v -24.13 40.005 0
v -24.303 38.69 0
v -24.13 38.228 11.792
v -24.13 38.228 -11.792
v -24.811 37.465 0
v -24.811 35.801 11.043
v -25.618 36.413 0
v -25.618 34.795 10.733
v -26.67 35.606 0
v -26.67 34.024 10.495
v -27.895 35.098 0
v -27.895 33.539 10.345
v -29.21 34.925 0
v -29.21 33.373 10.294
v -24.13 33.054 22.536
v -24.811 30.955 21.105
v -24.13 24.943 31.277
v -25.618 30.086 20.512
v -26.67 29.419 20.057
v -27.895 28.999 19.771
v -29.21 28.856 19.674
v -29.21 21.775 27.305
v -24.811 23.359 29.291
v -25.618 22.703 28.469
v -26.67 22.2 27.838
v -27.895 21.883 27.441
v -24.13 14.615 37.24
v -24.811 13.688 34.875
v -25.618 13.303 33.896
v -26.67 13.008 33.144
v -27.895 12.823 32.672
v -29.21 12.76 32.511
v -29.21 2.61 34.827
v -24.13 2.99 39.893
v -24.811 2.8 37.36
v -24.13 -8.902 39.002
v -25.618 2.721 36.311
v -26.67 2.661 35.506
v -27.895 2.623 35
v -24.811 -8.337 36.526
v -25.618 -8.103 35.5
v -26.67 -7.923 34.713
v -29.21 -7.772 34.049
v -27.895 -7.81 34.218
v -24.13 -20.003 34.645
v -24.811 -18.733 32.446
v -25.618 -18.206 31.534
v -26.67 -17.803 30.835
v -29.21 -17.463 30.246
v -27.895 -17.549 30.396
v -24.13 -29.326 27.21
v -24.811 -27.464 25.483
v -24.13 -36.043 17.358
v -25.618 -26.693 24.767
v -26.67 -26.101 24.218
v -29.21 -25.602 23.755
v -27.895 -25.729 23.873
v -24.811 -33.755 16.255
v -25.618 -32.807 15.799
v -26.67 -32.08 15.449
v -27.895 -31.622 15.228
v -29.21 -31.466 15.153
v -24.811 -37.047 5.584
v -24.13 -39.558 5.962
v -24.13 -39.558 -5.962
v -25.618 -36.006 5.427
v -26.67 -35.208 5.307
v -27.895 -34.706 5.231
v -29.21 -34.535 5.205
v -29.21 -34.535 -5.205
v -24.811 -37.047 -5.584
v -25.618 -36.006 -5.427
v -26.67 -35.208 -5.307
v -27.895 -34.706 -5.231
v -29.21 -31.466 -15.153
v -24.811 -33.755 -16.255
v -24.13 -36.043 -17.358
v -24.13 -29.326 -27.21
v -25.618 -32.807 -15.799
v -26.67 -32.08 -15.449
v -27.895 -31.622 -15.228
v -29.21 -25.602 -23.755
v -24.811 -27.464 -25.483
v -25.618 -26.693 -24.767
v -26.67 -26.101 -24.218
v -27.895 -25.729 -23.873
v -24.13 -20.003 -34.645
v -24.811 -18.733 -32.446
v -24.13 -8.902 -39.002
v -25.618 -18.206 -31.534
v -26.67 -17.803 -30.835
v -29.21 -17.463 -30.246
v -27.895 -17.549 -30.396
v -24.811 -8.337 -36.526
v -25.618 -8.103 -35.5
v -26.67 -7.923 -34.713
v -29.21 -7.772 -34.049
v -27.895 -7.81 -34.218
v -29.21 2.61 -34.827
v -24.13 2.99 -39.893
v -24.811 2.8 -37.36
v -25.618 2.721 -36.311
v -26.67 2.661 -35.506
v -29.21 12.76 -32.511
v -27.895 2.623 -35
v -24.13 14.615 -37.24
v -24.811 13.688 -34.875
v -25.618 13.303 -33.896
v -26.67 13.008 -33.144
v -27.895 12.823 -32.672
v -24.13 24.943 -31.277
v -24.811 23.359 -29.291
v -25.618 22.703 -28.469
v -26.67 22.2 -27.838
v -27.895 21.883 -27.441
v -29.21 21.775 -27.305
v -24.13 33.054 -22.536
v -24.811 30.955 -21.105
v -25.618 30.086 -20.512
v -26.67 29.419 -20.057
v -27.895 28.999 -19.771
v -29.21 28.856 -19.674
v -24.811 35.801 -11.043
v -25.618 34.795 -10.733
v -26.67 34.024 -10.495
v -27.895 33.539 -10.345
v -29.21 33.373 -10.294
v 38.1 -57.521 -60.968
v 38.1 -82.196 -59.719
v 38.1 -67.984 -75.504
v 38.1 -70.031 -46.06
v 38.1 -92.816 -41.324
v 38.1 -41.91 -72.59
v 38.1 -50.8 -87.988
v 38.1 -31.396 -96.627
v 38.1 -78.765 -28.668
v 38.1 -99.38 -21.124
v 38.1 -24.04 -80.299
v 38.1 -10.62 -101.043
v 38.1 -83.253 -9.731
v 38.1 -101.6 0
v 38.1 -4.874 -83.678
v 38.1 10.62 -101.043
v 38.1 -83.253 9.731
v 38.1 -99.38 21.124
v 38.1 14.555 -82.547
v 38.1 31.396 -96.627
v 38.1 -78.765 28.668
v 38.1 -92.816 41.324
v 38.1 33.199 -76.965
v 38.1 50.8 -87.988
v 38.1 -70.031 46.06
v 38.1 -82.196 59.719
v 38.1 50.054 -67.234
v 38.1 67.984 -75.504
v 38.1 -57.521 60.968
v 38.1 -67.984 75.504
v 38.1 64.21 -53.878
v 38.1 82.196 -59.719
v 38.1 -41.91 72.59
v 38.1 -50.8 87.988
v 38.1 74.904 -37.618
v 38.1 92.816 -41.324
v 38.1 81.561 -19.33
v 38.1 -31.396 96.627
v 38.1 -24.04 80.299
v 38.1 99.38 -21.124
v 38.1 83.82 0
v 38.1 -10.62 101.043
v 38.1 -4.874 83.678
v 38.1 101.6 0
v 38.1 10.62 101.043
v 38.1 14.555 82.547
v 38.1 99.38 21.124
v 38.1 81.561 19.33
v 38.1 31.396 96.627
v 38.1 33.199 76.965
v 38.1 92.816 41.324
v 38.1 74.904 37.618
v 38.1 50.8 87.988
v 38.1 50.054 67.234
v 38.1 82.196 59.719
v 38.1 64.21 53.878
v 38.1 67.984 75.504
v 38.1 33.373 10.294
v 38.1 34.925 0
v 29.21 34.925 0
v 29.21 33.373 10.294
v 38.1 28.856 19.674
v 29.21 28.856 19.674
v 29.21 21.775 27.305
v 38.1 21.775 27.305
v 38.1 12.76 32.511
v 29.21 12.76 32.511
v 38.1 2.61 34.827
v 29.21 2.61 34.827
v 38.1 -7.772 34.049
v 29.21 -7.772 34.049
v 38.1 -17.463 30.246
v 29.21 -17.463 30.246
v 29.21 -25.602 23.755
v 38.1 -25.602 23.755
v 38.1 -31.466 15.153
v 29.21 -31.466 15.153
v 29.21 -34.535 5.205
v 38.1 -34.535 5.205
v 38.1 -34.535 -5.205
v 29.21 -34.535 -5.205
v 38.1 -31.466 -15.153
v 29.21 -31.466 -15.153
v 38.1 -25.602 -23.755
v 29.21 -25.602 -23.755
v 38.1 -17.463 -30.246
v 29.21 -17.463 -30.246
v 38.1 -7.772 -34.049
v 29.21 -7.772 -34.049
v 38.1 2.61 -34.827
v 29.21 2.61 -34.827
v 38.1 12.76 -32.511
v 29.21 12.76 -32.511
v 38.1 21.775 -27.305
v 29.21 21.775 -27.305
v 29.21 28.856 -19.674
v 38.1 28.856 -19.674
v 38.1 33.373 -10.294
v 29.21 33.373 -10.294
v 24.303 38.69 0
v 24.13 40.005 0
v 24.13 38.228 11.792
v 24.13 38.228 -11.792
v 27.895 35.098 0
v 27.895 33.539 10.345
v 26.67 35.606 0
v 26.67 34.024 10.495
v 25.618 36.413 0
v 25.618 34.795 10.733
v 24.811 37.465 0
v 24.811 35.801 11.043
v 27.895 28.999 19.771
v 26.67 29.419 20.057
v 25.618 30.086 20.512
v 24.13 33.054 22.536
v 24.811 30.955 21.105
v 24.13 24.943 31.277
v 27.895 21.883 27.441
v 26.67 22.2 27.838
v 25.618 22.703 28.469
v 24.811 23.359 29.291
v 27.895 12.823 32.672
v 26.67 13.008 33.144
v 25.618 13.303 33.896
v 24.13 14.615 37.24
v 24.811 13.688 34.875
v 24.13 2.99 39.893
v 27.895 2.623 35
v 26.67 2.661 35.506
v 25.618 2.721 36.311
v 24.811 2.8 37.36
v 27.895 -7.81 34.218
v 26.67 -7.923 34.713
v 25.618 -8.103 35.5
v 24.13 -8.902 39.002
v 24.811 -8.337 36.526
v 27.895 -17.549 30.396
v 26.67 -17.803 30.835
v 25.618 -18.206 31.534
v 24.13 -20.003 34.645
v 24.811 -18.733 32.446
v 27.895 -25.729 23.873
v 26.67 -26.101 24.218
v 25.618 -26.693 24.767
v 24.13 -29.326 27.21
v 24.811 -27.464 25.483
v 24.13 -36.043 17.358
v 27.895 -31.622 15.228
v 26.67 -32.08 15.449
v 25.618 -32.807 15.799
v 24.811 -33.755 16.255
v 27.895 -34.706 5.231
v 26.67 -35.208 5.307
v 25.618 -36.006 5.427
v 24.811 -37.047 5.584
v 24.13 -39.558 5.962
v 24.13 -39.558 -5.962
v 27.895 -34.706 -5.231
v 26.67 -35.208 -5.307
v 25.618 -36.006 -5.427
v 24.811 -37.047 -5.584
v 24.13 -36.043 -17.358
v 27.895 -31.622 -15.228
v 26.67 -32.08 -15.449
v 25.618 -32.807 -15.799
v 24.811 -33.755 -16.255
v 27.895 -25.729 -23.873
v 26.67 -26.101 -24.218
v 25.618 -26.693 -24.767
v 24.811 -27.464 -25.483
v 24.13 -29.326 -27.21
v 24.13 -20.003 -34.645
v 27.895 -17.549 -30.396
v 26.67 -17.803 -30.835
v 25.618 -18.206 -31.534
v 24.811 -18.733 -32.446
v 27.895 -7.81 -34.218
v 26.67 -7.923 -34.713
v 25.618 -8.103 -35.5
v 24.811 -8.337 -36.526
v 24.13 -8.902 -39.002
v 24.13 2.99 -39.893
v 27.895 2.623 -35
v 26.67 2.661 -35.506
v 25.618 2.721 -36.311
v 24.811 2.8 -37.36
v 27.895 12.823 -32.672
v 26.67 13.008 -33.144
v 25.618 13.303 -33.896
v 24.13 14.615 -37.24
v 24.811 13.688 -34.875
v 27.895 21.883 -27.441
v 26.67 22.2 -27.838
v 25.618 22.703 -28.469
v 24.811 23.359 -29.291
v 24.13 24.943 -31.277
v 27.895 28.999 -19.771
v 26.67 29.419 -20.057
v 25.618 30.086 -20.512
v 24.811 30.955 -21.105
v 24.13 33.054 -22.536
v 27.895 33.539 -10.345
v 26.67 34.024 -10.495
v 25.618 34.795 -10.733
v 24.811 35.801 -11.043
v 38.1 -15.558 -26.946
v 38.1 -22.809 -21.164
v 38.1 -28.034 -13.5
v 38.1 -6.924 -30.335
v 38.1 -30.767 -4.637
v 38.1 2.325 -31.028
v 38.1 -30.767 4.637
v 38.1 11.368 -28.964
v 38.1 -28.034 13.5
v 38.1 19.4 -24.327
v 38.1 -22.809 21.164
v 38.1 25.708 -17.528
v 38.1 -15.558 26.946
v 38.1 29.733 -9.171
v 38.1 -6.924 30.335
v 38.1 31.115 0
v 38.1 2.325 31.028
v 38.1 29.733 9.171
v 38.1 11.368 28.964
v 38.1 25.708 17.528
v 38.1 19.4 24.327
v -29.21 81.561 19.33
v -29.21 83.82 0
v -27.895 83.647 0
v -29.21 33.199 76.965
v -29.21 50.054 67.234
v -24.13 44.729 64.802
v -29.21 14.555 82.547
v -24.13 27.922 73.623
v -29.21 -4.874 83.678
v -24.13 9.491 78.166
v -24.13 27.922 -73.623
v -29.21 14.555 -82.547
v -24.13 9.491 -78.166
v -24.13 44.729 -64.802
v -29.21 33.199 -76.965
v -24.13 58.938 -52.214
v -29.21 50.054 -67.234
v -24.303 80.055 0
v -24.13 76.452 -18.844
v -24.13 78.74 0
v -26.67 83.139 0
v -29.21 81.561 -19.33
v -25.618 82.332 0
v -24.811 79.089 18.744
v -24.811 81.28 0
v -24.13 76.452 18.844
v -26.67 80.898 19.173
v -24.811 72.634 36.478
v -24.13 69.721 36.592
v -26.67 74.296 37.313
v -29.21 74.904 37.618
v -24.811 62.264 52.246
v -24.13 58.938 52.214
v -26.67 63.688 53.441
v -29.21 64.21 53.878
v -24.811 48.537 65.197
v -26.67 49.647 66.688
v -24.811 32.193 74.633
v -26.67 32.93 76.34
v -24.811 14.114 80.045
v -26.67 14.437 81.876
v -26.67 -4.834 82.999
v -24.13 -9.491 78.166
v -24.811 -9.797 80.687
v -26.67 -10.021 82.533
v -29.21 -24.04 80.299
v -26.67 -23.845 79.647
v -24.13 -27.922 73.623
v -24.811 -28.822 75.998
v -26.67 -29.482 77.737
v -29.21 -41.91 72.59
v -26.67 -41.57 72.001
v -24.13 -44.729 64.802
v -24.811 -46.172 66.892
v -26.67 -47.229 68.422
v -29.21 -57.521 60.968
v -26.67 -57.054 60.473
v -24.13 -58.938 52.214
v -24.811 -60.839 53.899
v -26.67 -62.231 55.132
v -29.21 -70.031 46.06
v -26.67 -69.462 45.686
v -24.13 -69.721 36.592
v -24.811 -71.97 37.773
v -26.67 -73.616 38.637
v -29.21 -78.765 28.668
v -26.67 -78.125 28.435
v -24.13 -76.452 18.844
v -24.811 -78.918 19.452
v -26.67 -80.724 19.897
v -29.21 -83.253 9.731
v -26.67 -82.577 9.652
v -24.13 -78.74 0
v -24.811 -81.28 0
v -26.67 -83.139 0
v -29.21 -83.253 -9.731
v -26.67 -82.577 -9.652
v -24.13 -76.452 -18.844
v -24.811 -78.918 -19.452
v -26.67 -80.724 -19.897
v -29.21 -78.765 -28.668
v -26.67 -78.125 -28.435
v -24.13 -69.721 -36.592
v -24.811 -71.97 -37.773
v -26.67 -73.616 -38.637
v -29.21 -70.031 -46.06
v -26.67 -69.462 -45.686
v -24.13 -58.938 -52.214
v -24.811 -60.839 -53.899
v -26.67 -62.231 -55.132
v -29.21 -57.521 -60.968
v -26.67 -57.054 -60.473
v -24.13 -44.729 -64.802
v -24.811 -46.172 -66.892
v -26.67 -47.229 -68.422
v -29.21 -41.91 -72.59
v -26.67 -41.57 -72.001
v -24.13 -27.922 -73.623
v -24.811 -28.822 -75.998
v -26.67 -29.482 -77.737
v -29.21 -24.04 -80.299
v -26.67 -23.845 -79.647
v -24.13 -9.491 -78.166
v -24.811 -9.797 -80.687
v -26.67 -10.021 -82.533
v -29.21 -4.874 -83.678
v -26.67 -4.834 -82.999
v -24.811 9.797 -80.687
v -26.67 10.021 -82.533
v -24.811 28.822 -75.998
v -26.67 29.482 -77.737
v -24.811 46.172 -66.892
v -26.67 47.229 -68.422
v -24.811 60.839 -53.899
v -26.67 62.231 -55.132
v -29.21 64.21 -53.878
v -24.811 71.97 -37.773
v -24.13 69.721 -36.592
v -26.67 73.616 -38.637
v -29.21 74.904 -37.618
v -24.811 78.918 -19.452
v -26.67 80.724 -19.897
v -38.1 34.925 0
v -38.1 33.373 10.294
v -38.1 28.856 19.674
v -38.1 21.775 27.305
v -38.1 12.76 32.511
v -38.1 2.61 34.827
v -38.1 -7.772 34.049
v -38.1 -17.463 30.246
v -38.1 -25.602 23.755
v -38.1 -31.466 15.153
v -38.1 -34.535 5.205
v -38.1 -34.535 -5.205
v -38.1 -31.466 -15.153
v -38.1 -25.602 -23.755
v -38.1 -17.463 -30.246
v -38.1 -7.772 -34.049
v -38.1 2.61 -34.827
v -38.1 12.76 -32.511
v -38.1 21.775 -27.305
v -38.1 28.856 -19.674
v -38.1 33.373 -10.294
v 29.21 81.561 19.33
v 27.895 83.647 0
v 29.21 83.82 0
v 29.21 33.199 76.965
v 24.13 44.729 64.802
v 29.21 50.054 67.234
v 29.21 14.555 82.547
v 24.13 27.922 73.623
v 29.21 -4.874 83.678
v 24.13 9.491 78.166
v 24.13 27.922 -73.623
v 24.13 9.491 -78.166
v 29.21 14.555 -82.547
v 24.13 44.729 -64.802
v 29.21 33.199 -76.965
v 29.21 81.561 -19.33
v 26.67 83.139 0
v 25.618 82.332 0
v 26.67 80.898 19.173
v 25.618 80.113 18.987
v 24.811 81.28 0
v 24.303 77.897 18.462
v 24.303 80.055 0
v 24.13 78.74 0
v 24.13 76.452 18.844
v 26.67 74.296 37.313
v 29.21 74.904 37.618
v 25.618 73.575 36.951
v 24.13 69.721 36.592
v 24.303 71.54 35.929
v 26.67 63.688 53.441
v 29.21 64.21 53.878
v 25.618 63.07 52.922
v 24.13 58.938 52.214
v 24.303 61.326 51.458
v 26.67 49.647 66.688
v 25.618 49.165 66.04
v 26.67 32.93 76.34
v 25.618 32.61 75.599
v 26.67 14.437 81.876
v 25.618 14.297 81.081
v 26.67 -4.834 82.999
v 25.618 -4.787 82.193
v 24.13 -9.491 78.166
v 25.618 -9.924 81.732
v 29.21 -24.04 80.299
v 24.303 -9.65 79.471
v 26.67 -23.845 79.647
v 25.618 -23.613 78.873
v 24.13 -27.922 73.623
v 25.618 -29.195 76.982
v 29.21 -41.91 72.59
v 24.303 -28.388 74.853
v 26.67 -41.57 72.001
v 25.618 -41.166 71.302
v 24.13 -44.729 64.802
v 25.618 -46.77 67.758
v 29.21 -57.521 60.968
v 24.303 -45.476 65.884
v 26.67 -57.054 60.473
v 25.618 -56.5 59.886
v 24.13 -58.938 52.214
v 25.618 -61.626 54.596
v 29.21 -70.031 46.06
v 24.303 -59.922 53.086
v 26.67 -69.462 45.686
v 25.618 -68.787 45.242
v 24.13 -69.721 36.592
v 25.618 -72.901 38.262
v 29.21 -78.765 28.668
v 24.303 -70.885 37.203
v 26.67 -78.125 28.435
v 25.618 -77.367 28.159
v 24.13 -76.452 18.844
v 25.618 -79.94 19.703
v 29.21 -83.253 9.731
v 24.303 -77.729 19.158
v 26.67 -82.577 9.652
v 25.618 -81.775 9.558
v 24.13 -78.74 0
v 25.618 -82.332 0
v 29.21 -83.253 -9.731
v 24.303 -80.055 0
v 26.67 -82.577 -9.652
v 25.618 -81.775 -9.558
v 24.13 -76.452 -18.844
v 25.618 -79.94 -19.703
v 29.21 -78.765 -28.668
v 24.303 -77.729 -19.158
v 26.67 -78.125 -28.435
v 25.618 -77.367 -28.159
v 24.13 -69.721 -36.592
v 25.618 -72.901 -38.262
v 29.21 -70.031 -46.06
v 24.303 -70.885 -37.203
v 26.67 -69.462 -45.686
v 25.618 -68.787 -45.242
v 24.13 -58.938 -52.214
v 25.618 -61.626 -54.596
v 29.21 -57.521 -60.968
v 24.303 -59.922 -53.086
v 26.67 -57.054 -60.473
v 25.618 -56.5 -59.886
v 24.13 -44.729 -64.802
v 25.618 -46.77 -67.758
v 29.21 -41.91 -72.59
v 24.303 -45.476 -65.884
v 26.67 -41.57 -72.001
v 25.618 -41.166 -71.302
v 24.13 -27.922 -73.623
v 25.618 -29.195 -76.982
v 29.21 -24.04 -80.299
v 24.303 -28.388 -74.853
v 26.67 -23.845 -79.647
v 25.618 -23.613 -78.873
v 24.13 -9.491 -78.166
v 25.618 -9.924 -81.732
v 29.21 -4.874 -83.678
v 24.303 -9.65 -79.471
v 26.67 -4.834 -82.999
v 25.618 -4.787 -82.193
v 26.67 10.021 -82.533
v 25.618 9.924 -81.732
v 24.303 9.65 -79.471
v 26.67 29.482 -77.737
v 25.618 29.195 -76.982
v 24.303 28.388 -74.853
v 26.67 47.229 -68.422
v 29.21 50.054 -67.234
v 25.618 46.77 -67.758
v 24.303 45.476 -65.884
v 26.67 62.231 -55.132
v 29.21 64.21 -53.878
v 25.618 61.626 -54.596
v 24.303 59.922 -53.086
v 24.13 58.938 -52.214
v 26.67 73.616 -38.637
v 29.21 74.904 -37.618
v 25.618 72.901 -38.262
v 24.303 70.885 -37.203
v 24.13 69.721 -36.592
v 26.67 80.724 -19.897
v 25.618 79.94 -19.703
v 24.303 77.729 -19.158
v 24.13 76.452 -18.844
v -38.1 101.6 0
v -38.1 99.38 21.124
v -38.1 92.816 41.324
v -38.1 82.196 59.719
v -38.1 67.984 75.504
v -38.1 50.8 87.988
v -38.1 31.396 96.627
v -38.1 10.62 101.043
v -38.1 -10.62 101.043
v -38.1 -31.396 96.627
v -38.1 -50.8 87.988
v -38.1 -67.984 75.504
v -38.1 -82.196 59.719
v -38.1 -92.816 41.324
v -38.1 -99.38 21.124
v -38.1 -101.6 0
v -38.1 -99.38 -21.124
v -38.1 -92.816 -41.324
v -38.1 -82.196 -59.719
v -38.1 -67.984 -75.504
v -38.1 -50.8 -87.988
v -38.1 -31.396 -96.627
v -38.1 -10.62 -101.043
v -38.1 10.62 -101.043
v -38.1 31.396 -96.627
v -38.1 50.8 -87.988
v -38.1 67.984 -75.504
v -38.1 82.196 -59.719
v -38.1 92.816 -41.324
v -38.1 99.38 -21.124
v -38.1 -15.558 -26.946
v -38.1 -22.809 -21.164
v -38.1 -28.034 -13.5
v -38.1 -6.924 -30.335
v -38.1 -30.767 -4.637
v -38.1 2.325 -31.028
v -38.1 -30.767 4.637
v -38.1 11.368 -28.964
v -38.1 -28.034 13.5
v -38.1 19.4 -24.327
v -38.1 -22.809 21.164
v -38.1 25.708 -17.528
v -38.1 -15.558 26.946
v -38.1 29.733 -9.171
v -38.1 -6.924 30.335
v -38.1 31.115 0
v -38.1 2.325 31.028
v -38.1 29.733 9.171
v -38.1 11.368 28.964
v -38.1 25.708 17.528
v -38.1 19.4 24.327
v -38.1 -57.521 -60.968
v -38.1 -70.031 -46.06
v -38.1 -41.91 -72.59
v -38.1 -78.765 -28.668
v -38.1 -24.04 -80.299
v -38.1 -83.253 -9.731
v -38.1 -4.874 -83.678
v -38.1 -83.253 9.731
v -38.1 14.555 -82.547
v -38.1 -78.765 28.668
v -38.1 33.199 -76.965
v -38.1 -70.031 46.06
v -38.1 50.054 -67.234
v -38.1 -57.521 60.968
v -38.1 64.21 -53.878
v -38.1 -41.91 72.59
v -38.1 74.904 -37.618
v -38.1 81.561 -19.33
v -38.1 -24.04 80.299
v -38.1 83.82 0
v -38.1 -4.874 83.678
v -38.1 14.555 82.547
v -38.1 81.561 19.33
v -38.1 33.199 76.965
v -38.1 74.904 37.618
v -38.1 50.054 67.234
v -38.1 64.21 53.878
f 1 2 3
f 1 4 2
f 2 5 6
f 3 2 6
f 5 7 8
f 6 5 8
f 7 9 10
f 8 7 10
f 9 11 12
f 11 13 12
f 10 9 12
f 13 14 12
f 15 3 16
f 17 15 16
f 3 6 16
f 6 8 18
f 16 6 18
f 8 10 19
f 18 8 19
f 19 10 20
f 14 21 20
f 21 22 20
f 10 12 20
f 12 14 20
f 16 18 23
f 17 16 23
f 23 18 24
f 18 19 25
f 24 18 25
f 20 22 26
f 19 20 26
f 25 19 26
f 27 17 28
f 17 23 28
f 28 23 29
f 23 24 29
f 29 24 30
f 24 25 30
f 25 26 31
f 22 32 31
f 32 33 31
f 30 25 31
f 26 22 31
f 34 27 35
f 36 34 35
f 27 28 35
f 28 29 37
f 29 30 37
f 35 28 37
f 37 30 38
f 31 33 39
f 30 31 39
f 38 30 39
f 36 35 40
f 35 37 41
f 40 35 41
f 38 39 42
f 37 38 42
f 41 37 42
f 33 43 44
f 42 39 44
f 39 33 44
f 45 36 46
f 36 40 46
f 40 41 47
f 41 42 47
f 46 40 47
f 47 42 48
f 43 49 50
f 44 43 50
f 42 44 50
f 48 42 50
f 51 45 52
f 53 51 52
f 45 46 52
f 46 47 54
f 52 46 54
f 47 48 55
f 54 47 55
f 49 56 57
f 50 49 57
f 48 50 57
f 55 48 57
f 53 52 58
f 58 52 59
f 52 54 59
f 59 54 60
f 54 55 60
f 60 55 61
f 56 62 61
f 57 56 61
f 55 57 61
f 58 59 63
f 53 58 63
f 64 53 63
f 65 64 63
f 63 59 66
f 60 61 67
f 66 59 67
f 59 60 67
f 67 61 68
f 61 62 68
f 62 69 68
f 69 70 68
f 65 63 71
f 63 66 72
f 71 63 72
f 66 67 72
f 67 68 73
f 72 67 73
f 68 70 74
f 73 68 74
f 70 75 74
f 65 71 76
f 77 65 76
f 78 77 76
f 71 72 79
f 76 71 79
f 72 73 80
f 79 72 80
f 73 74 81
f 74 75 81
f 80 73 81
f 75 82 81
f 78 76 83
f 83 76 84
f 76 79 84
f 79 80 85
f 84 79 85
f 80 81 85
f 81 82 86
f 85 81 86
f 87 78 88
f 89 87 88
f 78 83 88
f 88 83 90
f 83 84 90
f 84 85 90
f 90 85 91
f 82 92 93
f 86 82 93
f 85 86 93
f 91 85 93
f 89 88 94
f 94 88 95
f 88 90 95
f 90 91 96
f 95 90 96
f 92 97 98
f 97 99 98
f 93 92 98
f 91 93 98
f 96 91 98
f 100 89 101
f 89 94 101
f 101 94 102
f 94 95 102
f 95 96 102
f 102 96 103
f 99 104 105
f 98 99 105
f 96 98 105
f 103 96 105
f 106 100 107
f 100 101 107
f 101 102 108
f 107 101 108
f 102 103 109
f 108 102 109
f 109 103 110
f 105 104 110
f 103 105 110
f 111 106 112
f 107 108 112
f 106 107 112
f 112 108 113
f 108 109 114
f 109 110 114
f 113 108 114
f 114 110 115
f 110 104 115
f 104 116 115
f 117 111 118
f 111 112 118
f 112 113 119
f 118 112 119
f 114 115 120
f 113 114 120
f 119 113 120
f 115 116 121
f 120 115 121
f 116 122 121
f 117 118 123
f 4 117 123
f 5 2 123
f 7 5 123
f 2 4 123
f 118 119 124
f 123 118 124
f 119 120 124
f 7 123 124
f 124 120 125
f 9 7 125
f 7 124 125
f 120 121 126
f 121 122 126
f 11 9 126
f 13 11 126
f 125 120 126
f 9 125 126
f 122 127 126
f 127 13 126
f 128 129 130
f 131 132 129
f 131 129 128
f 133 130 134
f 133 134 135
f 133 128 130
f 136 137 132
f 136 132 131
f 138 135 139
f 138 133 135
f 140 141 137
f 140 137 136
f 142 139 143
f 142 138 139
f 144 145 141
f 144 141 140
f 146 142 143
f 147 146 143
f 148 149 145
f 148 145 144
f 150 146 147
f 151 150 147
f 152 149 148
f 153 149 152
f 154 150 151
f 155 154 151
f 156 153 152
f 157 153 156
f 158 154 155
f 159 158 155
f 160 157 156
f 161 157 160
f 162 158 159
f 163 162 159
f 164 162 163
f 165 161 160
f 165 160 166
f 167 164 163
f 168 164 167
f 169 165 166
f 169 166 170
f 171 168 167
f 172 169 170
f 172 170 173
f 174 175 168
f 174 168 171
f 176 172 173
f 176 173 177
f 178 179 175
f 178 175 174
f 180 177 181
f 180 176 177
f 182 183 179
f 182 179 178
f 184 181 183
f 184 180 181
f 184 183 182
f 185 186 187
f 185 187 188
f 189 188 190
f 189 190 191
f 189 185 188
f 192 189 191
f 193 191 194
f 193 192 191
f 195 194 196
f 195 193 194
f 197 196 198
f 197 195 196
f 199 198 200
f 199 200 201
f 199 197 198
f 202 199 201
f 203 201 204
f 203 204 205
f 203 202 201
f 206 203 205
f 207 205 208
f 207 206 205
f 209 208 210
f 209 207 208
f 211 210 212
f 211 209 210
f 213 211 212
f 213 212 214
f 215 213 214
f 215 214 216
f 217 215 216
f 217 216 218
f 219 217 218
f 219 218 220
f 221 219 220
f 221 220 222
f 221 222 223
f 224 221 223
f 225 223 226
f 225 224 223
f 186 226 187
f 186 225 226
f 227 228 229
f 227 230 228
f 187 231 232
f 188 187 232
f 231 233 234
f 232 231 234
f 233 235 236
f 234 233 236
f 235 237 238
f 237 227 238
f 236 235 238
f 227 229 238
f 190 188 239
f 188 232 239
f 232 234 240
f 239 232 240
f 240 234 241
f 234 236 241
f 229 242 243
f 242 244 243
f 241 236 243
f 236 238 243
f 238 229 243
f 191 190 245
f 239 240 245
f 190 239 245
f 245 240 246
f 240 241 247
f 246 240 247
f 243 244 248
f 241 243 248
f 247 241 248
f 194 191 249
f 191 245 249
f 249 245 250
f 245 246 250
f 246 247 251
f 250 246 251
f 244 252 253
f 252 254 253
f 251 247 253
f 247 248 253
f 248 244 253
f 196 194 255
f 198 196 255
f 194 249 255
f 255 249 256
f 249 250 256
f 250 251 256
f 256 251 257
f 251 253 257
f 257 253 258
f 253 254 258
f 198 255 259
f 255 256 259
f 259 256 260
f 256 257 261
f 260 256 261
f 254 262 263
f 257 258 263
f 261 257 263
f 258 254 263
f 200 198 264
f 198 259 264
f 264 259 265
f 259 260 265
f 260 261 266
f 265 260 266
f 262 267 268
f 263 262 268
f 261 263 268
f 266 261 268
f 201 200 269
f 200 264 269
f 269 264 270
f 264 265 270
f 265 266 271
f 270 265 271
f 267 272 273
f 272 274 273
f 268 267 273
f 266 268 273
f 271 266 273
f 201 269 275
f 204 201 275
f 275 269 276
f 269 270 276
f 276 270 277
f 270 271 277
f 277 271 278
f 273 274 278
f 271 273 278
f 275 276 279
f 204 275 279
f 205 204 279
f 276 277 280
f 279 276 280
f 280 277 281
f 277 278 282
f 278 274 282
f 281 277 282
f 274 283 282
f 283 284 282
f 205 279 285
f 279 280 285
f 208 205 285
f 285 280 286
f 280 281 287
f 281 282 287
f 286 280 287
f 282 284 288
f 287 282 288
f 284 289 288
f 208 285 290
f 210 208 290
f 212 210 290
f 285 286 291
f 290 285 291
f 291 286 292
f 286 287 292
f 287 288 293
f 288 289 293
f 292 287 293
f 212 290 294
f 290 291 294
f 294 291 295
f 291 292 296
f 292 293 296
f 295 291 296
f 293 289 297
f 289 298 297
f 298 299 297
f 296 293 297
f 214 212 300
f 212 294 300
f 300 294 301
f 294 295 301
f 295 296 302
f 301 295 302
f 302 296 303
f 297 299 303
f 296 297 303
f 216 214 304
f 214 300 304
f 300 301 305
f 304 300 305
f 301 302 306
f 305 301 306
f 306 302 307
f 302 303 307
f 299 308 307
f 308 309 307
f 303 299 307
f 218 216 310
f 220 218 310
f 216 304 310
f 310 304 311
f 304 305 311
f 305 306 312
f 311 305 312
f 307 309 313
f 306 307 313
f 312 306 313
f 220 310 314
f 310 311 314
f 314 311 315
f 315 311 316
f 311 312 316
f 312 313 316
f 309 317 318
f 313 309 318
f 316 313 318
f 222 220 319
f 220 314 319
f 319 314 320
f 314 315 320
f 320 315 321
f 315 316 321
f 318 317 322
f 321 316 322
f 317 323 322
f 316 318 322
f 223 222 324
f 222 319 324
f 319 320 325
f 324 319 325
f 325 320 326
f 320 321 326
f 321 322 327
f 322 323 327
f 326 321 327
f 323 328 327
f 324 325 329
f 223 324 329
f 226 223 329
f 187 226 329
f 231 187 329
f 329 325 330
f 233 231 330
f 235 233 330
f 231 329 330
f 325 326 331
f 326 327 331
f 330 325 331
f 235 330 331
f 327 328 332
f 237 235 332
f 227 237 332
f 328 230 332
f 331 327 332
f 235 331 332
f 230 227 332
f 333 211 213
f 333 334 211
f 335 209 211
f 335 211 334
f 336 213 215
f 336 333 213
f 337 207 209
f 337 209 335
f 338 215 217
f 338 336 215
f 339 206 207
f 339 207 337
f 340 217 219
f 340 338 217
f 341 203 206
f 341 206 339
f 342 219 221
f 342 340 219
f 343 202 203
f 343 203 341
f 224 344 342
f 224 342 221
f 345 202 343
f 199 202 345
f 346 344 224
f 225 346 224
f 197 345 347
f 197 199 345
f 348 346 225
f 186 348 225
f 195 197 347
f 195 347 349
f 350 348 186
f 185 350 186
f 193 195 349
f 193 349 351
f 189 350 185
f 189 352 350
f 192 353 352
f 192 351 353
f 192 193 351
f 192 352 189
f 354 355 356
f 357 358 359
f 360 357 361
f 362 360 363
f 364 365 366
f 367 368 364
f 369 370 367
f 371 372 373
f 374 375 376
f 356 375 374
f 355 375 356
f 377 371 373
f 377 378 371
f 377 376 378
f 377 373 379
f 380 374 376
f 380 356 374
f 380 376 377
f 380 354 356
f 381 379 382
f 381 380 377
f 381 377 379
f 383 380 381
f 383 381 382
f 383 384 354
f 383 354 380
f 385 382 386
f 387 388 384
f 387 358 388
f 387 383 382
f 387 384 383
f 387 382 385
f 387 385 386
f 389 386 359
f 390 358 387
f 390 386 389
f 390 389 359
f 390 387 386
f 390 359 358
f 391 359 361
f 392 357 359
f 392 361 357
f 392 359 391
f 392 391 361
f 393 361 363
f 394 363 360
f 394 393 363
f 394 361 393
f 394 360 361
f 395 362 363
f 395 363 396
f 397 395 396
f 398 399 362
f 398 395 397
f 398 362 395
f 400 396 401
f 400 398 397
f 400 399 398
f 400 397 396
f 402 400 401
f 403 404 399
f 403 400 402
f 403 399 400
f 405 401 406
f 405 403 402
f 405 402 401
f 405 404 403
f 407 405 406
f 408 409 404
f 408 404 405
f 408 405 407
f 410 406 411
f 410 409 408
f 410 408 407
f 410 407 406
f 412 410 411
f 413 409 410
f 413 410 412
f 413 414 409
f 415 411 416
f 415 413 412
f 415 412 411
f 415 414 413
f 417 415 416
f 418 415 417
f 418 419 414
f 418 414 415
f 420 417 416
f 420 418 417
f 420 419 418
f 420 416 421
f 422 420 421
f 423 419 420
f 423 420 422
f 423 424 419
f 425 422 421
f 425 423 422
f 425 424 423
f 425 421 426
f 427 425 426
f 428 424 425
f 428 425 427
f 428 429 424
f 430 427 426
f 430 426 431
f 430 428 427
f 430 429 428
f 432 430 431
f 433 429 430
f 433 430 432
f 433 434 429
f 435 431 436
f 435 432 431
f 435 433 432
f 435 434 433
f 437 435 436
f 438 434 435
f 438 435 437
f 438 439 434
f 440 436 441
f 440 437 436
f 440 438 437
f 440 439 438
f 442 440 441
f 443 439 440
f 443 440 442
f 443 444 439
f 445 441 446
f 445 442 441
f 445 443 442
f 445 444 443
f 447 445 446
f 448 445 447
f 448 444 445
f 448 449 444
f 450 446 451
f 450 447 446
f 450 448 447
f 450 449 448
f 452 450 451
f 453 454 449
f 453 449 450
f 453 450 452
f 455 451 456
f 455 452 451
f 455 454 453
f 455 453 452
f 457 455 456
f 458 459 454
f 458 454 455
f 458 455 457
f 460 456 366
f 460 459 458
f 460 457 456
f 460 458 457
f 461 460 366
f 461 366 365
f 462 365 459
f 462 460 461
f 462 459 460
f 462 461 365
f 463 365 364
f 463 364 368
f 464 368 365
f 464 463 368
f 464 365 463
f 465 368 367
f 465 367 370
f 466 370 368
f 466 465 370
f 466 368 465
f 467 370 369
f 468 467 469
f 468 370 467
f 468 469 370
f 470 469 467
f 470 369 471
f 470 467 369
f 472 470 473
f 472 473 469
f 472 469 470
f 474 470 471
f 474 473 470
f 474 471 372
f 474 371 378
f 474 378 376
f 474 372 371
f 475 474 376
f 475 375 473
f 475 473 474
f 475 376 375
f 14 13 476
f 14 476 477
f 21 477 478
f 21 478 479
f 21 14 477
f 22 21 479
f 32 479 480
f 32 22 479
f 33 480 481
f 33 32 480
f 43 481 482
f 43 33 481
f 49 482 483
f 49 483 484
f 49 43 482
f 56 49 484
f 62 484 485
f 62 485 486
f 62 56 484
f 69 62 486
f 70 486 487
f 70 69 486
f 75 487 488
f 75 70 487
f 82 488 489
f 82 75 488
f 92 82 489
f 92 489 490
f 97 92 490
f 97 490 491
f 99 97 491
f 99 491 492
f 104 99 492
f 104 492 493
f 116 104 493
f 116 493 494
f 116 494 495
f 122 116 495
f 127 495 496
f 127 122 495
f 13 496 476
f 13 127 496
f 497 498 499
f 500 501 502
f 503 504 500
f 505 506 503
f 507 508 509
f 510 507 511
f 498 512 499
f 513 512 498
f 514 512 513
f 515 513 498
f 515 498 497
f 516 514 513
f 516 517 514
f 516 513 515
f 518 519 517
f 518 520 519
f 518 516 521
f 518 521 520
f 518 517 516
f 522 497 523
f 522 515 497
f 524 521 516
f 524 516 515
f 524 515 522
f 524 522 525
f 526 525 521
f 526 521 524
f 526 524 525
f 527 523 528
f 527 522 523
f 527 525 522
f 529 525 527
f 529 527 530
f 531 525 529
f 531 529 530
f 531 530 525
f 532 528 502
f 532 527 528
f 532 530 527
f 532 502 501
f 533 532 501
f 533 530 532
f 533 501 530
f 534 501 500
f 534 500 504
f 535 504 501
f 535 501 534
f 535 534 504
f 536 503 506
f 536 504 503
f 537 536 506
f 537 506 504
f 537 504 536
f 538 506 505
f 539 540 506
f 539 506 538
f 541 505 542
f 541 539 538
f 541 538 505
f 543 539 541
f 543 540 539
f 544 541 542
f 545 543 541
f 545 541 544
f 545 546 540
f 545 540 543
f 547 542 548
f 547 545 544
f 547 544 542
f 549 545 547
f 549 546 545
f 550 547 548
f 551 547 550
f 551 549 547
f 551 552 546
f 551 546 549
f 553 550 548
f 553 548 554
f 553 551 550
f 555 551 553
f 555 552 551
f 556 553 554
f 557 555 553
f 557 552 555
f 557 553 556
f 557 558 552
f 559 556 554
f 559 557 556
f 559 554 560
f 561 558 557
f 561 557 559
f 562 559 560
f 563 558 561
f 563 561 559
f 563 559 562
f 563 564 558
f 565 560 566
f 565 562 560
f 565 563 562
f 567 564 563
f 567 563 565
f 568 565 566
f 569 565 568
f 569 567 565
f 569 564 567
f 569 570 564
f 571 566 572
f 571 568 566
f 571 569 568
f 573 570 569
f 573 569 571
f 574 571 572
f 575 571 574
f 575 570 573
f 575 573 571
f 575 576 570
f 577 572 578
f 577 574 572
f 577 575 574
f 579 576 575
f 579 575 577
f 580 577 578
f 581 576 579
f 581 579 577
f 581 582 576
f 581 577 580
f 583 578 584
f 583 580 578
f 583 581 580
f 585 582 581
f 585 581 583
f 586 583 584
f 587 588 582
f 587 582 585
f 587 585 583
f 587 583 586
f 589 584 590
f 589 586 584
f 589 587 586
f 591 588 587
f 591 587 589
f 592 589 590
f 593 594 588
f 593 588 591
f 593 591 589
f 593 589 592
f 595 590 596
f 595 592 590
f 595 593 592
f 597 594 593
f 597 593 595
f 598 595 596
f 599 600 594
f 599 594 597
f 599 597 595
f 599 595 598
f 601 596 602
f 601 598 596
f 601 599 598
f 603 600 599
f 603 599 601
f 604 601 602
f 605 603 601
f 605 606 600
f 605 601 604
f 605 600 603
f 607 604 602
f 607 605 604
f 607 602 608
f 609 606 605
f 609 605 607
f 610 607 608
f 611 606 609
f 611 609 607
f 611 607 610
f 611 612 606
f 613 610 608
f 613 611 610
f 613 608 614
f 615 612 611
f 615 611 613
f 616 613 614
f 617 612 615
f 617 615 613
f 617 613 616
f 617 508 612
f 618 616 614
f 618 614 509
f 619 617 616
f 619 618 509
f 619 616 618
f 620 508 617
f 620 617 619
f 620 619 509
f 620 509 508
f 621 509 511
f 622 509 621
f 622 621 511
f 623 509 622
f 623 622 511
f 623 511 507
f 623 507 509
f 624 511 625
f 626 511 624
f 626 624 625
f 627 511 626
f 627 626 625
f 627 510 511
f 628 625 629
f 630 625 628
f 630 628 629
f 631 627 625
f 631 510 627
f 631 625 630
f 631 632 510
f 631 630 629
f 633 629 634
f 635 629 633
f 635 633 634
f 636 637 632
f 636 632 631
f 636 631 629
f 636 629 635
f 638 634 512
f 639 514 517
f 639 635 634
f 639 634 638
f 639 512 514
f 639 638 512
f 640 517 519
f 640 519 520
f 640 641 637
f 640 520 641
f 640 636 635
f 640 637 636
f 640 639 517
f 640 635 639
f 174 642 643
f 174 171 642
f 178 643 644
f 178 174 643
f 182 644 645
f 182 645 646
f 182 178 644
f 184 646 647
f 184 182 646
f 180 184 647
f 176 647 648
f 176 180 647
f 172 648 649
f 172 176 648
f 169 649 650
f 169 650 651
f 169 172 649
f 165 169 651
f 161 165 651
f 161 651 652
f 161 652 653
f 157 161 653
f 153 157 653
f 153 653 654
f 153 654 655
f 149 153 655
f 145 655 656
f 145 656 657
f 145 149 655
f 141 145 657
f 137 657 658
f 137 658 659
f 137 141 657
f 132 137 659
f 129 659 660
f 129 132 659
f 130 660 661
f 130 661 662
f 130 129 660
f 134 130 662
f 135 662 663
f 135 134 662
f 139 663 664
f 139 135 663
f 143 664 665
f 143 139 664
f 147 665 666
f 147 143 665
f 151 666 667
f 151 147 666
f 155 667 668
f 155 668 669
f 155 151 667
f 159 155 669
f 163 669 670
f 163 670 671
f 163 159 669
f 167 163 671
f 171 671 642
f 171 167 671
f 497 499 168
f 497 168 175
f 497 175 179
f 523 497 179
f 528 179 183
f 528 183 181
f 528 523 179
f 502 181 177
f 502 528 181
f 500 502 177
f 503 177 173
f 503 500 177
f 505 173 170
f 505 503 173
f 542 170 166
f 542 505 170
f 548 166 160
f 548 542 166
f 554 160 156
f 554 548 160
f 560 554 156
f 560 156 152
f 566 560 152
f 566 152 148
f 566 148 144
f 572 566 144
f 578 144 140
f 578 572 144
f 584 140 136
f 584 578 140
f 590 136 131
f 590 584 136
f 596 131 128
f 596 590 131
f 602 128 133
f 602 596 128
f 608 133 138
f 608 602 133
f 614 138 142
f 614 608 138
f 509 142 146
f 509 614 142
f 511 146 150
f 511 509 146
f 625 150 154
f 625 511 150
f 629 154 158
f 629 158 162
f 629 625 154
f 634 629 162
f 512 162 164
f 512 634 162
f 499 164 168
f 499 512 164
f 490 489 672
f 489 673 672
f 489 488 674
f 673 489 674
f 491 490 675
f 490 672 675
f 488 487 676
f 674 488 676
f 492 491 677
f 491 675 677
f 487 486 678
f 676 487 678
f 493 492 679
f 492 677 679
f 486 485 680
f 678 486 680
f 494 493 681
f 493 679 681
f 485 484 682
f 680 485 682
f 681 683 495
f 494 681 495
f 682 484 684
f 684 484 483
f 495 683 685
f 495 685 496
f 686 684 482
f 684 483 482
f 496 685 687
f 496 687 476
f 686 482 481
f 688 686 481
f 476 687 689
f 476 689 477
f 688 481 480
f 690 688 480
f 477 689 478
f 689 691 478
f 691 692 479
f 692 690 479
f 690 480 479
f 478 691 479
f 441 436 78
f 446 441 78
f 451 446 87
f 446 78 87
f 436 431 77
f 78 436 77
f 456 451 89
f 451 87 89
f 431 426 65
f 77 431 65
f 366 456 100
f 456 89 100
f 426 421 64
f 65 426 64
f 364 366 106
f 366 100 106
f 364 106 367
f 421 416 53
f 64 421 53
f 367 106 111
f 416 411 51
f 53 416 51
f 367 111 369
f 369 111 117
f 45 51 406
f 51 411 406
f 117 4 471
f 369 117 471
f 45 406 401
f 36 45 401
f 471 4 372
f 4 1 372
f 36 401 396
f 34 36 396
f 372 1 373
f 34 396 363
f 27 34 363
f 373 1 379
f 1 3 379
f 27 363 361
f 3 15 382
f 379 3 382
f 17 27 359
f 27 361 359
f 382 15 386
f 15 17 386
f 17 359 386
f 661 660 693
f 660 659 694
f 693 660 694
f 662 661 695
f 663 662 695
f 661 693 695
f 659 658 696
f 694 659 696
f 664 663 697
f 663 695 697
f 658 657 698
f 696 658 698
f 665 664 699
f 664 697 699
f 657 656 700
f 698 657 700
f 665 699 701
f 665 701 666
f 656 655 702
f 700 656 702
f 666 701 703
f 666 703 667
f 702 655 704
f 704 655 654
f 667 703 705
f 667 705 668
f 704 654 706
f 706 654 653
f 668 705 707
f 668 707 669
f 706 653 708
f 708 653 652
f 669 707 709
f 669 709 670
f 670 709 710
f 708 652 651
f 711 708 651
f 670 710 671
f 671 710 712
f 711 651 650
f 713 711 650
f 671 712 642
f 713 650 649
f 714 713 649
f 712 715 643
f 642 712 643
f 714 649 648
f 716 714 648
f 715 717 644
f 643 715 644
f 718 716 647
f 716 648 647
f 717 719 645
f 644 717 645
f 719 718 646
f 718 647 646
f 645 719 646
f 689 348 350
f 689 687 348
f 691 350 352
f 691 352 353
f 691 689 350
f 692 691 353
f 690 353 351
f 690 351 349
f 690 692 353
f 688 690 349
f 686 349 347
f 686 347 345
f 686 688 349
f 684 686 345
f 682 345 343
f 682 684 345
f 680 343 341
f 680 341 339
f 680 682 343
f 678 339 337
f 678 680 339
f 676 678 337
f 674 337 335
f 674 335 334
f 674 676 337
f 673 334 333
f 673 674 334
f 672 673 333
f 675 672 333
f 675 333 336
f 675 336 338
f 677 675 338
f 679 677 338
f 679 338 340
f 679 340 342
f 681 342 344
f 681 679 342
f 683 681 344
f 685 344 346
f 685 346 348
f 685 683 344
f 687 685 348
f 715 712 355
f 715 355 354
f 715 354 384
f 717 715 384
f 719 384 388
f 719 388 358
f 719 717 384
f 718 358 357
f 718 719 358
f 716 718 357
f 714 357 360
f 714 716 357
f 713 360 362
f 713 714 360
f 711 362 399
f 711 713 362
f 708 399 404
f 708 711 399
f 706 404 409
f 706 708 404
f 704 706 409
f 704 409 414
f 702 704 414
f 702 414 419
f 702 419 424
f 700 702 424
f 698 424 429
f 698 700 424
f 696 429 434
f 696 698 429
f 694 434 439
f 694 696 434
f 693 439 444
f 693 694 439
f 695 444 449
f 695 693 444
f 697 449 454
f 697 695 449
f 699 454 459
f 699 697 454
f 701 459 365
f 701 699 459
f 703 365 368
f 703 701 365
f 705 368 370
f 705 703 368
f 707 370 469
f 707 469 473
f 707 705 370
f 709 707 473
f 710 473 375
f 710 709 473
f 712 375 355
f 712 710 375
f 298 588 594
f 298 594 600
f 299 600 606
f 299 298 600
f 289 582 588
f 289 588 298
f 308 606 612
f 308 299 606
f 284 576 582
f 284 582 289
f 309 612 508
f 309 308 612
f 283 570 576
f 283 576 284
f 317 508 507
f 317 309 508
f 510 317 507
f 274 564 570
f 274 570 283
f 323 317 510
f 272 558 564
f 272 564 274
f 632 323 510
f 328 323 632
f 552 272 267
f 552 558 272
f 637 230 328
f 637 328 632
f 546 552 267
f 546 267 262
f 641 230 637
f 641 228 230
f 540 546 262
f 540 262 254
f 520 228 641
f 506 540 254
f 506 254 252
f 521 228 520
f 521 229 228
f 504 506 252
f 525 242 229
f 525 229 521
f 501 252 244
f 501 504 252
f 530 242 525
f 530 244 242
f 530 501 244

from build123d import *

# Parameters (mm, degrees)
F0_R          = 101.6
F0_R_2        = 83.82
F1_DEPTH      = 38.1
F1_DEPTH_BACK = 38.1
F0_R_3        = 34.925
F0_R_4        = 31.115
F2_DEPTH      = 24.13
F2_DEPTH_BACK = 24.13
F3_R          = 5.08


# Not quite as in the source:
# - a length typed as a fraction of an inch, garbled in the dataset ("3 / 203.2 mm" for 3/8 in), is restored


with BuildPart() as f1:
    # F0 (on Right) → F1 (new body, two sides)
    with BuildSketch(Plane.YZ) as f1_sk:
        Circle(F0_R)
        Circle(F0_R_2, mode=Mode.SUBTRACT)
    extrude(amount=F1_DEPTH)
    extrude(f1_sk.sketch, amount=-F1_DEPTH_BACK)



with BuildPart() as f1b:
    # F0 (on Right) → F1, piece 2 (new body, two sides)
    with BuildSketch(Plane.YZ) as f1_2_sk:
        Circle(F0_R_3)
        Circle(F0_R_4, mode=Mode.SUBTRACT)
    extrude(amount=F1_DEPTH)
    extrude(f1_2_sk.sketch, amount=-F1_DEPTH_BACK)


with BuildPart() as f1_1:
    add(f1.part)

    add(f1b.part)  # F2 merges F1b
    # F0 (on Right) → F2 (join, two sides)
    with BuildSketch(Plane.YZ) as f2_sk:
        Circle(F0_R_2)
        Circle(F0_R_3, mode=Mode.SUBTRACT)
    extrude(amount=F2_DEPTH)
    extrude(f2_sk.sketch, amount=-F2_DEPTH_BACK)

    # F3
    f3_edges = [f1_1.edges().sort_by_distance(p)[0] for p in [
        (24.13, -34.925, 0),
        (24.13, -83.82, 0),
        (-24.13, -34.925, 0),
        (-24.13, -83.82, 0),
    ]]
    fillet(f3_edges, radius=F3_R)


solid = f1_1.part
